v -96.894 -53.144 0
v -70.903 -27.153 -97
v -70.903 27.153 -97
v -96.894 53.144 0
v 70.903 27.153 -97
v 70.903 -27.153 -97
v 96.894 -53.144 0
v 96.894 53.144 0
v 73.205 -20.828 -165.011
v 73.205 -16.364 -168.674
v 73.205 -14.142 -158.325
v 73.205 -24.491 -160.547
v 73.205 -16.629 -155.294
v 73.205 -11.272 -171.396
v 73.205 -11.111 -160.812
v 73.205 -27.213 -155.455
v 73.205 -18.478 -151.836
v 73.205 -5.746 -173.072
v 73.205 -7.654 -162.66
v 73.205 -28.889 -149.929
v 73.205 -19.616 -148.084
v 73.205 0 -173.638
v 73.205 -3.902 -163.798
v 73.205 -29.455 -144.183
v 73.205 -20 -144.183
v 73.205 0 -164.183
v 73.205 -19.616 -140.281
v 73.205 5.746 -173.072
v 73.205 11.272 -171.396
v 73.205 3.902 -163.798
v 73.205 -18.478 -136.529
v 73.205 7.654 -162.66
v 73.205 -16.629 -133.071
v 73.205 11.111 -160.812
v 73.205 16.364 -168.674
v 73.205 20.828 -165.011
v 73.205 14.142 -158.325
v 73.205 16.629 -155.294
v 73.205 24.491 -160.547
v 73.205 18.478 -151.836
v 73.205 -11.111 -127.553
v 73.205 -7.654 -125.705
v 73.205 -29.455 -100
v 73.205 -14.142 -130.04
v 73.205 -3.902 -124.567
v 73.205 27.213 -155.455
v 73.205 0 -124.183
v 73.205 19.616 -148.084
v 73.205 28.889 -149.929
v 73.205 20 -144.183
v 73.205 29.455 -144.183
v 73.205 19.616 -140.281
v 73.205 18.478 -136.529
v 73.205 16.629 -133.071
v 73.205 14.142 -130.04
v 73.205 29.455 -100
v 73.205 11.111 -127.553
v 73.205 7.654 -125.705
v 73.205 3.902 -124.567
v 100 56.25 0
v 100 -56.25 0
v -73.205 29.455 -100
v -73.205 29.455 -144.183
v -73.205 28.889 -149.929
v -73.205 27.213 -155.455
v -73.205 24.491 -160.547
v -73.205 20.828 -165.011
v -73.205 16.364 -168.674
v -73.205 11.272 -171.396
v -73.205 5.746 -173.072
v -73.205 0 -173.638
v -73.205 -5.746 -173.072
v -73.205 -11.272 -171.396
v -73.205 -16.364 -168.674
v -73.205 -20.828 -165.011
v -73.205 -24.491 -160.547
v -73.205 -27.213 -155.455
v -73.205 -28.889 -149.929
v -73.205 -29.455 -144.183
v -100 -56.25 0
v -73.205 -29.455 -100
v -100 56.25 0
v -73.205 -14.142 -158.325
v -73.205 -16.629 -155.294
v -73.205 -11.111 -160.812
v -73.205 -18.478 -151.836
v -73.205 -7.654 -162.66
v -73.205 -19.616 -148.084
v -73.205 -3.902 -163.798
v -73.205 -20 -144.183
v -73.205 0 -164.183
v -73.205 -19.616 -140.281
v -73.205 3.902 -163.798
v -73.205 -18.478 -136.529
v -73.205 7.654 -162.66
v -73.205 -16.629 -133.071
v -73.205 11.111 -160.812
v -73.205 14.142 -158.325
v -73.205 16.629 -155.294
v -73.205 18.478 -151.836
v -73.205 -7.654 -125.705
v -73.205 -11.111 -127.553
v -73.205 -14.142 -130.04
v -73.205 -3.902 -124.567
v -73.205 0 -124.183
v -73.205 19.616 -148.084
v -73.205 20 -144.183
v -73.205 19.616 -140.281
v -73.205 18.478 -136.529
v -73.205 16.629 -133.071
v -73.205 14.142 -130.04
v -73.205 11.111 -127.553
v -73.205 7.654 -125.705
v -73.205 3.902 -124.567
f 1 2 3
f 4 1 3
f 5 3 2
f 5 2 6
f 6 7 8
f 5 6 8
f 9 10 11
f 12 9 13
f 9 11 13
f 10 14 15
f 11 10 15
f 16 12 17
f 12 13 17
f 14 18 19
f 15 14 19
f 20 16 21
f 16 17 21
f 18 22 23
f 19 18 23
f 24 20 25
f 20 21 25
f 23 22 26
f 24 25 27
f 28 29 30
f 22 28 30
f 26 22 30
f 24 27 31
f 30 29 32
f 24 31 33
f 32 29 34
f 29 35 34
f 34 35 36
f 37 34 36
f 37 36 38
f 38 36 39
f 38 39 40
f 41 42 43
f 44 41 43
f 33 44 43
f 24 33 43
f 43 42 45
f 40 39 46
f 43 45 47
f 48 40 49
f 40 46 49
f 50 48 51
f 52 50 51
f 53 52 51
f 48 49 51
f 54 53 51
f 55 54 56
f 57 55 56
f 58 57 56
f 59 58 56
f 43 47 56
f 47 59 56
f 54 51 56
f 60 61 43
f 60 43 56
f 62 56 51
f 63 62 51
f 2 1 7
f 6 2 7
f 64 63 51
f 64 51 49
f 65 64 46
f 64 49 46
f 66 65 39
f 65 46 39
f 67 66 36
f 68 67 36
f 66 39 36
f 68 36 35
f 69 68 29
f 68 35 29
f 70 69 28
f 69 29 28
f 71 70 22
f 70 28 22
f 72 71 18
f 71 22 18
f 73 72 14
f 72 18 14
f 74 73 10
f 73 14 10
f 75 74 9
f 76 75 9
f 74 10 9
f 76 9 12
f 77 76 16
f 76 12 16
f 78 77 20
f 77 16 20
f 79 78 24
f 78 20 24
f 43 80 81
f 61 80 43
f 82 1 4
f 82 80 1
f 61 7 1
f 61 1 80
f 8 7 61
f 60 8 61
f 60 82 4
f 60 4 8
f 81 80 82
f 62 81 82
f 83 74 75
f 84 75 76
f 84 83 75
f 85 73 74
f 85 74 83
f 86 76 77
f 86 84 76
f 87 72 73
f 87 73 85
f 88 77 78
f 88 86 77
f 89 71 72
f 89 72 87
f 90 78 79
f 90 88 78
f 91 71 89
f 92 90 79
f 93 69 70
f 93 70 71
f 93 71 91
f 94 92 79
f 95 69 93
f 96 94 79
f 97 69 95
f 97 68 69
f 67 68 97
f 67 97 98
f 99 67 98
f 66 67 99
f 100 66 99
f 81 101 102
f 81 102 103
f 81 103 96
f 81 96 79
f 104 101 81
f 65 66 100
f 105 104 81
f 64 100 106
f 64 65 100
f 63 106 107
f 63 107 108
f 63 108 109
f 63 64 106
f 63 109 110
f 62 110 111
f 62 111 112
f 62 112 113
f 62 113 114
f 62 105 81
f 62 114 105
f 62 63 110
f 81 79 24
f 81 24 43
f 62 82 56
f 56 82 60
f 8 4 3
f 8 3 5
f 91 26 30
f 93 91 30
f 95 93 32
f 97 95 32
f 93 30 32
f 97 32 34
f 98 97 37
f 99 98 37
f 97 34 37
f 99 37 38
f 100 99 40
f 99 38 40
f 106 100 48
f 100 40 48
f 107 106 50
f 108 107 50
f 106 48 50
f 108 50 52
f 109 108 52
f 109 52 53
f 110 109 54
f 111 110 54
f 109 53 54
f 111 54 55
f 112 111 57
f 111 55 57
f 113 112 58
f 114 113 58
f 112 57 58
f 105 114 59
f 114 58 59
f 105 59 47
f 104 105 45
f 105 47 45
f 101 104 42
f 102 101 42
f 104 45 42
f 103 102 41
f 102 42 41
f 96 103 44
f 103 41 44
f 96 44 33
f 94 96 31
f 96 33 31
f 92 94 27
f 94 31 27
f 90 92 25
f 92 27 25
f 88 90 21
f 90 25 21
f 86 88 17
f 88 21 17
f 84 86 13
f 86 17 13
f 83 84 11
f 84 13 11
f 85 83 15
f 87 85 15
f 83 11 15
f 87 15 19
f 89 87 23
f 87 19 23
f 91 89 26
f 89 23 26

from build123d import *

# Parameters (mm, degrees)
CAMERA_CONE_SKETCH_W      = 200
CAMERA_CONE_SKETCH_H      = 112.5
CAMERA_CONE_EXTRUDE_DEPTH = 100
CAMERA_CONE_EXTRUDE_DRAFT = -15
CAMERA_CONE_SHELL_T       = -3
HINGE_EXTRUDE_DEPTH       = 146.410161514
HINGE_HOLE_SKETCH_R       = 20
HINGE_HOLE_CUT_DEPTH      = 146.410161514


with BuildPart() as part:
    # Camera Cone Sketch → Camera Cone Extrude (with draft: the straight prism first)
    with BuildSketch(Plane.XY):
        Rectangle(CAMERA_CONE_SKETCH_W, CAMERA_CONE_SKETCH_H)
    extrude(amount=-CAMERA_CONE_EXTRUDE_DEPTH)
    # Camera Cone Extrude: the draft: its side faces are tilted about the plane it starts from
    camera_cone_extrude_sides = [part.faces().sort_by_distance(p)[0] for p in [
        (-100, 0, -50),
        (0, -56.25, -50),
        (100, 0, -50),
        (0, 56.25, -50),
    ]]
    draft(camera_cone_extrude_sides, Plane.XY, CAMERA_CONE_EXTRUDE_DRAFT)

    # Camera Cone Shell
    camera_cone_shell_openings = [part.faces().sort_by_distance(p)[0] for p in [
        (0, 0, 0),
    ]]
    offset(amount=CAMERA_CONE_SHELL_T, openings=camera_cone_shell_openings, kind=Kind.INTERSECTION)

    # Hinge Sketch → Hinge Extrude (add)
    with BuildSketch(Plane(origin=(73.205080757, 0, 0), x_dir=(0, 0, -1), z_dir=(1, 0, 0))):
        with BuildLine():
            Line((100, 29.455080757), (144.182621135, 29.455080757))
            ThreePointArc((144.182621135, 29.455080757), (173.637701892, 0), (144.182621135, -29.455080757))
            Line((144.182621135, -29.455080757), (100, -29.455080757))
            Line((100, -29.455080757), (100, 29.455080757))
        make_face()
    extrude(amount=-HINGE_EXTRUDE_DEPTH)

    # Hinge Hole Sketch → Hinge Hole Cut (cut)
    with BuildSketch(Plane(origin=(73.205080757, 0, 0), x_dir=(0, 0, -1), z_dir=(1, 0, 0))):
        with Locations((144.182621135, 0)):
            Circle(HINGE_HOLE_SKETCH_R)
    extrude(amount=-HINGE_HOLE_CUT_DEPTH, mode=Mode.SUBTRACT)


solid = part.part
